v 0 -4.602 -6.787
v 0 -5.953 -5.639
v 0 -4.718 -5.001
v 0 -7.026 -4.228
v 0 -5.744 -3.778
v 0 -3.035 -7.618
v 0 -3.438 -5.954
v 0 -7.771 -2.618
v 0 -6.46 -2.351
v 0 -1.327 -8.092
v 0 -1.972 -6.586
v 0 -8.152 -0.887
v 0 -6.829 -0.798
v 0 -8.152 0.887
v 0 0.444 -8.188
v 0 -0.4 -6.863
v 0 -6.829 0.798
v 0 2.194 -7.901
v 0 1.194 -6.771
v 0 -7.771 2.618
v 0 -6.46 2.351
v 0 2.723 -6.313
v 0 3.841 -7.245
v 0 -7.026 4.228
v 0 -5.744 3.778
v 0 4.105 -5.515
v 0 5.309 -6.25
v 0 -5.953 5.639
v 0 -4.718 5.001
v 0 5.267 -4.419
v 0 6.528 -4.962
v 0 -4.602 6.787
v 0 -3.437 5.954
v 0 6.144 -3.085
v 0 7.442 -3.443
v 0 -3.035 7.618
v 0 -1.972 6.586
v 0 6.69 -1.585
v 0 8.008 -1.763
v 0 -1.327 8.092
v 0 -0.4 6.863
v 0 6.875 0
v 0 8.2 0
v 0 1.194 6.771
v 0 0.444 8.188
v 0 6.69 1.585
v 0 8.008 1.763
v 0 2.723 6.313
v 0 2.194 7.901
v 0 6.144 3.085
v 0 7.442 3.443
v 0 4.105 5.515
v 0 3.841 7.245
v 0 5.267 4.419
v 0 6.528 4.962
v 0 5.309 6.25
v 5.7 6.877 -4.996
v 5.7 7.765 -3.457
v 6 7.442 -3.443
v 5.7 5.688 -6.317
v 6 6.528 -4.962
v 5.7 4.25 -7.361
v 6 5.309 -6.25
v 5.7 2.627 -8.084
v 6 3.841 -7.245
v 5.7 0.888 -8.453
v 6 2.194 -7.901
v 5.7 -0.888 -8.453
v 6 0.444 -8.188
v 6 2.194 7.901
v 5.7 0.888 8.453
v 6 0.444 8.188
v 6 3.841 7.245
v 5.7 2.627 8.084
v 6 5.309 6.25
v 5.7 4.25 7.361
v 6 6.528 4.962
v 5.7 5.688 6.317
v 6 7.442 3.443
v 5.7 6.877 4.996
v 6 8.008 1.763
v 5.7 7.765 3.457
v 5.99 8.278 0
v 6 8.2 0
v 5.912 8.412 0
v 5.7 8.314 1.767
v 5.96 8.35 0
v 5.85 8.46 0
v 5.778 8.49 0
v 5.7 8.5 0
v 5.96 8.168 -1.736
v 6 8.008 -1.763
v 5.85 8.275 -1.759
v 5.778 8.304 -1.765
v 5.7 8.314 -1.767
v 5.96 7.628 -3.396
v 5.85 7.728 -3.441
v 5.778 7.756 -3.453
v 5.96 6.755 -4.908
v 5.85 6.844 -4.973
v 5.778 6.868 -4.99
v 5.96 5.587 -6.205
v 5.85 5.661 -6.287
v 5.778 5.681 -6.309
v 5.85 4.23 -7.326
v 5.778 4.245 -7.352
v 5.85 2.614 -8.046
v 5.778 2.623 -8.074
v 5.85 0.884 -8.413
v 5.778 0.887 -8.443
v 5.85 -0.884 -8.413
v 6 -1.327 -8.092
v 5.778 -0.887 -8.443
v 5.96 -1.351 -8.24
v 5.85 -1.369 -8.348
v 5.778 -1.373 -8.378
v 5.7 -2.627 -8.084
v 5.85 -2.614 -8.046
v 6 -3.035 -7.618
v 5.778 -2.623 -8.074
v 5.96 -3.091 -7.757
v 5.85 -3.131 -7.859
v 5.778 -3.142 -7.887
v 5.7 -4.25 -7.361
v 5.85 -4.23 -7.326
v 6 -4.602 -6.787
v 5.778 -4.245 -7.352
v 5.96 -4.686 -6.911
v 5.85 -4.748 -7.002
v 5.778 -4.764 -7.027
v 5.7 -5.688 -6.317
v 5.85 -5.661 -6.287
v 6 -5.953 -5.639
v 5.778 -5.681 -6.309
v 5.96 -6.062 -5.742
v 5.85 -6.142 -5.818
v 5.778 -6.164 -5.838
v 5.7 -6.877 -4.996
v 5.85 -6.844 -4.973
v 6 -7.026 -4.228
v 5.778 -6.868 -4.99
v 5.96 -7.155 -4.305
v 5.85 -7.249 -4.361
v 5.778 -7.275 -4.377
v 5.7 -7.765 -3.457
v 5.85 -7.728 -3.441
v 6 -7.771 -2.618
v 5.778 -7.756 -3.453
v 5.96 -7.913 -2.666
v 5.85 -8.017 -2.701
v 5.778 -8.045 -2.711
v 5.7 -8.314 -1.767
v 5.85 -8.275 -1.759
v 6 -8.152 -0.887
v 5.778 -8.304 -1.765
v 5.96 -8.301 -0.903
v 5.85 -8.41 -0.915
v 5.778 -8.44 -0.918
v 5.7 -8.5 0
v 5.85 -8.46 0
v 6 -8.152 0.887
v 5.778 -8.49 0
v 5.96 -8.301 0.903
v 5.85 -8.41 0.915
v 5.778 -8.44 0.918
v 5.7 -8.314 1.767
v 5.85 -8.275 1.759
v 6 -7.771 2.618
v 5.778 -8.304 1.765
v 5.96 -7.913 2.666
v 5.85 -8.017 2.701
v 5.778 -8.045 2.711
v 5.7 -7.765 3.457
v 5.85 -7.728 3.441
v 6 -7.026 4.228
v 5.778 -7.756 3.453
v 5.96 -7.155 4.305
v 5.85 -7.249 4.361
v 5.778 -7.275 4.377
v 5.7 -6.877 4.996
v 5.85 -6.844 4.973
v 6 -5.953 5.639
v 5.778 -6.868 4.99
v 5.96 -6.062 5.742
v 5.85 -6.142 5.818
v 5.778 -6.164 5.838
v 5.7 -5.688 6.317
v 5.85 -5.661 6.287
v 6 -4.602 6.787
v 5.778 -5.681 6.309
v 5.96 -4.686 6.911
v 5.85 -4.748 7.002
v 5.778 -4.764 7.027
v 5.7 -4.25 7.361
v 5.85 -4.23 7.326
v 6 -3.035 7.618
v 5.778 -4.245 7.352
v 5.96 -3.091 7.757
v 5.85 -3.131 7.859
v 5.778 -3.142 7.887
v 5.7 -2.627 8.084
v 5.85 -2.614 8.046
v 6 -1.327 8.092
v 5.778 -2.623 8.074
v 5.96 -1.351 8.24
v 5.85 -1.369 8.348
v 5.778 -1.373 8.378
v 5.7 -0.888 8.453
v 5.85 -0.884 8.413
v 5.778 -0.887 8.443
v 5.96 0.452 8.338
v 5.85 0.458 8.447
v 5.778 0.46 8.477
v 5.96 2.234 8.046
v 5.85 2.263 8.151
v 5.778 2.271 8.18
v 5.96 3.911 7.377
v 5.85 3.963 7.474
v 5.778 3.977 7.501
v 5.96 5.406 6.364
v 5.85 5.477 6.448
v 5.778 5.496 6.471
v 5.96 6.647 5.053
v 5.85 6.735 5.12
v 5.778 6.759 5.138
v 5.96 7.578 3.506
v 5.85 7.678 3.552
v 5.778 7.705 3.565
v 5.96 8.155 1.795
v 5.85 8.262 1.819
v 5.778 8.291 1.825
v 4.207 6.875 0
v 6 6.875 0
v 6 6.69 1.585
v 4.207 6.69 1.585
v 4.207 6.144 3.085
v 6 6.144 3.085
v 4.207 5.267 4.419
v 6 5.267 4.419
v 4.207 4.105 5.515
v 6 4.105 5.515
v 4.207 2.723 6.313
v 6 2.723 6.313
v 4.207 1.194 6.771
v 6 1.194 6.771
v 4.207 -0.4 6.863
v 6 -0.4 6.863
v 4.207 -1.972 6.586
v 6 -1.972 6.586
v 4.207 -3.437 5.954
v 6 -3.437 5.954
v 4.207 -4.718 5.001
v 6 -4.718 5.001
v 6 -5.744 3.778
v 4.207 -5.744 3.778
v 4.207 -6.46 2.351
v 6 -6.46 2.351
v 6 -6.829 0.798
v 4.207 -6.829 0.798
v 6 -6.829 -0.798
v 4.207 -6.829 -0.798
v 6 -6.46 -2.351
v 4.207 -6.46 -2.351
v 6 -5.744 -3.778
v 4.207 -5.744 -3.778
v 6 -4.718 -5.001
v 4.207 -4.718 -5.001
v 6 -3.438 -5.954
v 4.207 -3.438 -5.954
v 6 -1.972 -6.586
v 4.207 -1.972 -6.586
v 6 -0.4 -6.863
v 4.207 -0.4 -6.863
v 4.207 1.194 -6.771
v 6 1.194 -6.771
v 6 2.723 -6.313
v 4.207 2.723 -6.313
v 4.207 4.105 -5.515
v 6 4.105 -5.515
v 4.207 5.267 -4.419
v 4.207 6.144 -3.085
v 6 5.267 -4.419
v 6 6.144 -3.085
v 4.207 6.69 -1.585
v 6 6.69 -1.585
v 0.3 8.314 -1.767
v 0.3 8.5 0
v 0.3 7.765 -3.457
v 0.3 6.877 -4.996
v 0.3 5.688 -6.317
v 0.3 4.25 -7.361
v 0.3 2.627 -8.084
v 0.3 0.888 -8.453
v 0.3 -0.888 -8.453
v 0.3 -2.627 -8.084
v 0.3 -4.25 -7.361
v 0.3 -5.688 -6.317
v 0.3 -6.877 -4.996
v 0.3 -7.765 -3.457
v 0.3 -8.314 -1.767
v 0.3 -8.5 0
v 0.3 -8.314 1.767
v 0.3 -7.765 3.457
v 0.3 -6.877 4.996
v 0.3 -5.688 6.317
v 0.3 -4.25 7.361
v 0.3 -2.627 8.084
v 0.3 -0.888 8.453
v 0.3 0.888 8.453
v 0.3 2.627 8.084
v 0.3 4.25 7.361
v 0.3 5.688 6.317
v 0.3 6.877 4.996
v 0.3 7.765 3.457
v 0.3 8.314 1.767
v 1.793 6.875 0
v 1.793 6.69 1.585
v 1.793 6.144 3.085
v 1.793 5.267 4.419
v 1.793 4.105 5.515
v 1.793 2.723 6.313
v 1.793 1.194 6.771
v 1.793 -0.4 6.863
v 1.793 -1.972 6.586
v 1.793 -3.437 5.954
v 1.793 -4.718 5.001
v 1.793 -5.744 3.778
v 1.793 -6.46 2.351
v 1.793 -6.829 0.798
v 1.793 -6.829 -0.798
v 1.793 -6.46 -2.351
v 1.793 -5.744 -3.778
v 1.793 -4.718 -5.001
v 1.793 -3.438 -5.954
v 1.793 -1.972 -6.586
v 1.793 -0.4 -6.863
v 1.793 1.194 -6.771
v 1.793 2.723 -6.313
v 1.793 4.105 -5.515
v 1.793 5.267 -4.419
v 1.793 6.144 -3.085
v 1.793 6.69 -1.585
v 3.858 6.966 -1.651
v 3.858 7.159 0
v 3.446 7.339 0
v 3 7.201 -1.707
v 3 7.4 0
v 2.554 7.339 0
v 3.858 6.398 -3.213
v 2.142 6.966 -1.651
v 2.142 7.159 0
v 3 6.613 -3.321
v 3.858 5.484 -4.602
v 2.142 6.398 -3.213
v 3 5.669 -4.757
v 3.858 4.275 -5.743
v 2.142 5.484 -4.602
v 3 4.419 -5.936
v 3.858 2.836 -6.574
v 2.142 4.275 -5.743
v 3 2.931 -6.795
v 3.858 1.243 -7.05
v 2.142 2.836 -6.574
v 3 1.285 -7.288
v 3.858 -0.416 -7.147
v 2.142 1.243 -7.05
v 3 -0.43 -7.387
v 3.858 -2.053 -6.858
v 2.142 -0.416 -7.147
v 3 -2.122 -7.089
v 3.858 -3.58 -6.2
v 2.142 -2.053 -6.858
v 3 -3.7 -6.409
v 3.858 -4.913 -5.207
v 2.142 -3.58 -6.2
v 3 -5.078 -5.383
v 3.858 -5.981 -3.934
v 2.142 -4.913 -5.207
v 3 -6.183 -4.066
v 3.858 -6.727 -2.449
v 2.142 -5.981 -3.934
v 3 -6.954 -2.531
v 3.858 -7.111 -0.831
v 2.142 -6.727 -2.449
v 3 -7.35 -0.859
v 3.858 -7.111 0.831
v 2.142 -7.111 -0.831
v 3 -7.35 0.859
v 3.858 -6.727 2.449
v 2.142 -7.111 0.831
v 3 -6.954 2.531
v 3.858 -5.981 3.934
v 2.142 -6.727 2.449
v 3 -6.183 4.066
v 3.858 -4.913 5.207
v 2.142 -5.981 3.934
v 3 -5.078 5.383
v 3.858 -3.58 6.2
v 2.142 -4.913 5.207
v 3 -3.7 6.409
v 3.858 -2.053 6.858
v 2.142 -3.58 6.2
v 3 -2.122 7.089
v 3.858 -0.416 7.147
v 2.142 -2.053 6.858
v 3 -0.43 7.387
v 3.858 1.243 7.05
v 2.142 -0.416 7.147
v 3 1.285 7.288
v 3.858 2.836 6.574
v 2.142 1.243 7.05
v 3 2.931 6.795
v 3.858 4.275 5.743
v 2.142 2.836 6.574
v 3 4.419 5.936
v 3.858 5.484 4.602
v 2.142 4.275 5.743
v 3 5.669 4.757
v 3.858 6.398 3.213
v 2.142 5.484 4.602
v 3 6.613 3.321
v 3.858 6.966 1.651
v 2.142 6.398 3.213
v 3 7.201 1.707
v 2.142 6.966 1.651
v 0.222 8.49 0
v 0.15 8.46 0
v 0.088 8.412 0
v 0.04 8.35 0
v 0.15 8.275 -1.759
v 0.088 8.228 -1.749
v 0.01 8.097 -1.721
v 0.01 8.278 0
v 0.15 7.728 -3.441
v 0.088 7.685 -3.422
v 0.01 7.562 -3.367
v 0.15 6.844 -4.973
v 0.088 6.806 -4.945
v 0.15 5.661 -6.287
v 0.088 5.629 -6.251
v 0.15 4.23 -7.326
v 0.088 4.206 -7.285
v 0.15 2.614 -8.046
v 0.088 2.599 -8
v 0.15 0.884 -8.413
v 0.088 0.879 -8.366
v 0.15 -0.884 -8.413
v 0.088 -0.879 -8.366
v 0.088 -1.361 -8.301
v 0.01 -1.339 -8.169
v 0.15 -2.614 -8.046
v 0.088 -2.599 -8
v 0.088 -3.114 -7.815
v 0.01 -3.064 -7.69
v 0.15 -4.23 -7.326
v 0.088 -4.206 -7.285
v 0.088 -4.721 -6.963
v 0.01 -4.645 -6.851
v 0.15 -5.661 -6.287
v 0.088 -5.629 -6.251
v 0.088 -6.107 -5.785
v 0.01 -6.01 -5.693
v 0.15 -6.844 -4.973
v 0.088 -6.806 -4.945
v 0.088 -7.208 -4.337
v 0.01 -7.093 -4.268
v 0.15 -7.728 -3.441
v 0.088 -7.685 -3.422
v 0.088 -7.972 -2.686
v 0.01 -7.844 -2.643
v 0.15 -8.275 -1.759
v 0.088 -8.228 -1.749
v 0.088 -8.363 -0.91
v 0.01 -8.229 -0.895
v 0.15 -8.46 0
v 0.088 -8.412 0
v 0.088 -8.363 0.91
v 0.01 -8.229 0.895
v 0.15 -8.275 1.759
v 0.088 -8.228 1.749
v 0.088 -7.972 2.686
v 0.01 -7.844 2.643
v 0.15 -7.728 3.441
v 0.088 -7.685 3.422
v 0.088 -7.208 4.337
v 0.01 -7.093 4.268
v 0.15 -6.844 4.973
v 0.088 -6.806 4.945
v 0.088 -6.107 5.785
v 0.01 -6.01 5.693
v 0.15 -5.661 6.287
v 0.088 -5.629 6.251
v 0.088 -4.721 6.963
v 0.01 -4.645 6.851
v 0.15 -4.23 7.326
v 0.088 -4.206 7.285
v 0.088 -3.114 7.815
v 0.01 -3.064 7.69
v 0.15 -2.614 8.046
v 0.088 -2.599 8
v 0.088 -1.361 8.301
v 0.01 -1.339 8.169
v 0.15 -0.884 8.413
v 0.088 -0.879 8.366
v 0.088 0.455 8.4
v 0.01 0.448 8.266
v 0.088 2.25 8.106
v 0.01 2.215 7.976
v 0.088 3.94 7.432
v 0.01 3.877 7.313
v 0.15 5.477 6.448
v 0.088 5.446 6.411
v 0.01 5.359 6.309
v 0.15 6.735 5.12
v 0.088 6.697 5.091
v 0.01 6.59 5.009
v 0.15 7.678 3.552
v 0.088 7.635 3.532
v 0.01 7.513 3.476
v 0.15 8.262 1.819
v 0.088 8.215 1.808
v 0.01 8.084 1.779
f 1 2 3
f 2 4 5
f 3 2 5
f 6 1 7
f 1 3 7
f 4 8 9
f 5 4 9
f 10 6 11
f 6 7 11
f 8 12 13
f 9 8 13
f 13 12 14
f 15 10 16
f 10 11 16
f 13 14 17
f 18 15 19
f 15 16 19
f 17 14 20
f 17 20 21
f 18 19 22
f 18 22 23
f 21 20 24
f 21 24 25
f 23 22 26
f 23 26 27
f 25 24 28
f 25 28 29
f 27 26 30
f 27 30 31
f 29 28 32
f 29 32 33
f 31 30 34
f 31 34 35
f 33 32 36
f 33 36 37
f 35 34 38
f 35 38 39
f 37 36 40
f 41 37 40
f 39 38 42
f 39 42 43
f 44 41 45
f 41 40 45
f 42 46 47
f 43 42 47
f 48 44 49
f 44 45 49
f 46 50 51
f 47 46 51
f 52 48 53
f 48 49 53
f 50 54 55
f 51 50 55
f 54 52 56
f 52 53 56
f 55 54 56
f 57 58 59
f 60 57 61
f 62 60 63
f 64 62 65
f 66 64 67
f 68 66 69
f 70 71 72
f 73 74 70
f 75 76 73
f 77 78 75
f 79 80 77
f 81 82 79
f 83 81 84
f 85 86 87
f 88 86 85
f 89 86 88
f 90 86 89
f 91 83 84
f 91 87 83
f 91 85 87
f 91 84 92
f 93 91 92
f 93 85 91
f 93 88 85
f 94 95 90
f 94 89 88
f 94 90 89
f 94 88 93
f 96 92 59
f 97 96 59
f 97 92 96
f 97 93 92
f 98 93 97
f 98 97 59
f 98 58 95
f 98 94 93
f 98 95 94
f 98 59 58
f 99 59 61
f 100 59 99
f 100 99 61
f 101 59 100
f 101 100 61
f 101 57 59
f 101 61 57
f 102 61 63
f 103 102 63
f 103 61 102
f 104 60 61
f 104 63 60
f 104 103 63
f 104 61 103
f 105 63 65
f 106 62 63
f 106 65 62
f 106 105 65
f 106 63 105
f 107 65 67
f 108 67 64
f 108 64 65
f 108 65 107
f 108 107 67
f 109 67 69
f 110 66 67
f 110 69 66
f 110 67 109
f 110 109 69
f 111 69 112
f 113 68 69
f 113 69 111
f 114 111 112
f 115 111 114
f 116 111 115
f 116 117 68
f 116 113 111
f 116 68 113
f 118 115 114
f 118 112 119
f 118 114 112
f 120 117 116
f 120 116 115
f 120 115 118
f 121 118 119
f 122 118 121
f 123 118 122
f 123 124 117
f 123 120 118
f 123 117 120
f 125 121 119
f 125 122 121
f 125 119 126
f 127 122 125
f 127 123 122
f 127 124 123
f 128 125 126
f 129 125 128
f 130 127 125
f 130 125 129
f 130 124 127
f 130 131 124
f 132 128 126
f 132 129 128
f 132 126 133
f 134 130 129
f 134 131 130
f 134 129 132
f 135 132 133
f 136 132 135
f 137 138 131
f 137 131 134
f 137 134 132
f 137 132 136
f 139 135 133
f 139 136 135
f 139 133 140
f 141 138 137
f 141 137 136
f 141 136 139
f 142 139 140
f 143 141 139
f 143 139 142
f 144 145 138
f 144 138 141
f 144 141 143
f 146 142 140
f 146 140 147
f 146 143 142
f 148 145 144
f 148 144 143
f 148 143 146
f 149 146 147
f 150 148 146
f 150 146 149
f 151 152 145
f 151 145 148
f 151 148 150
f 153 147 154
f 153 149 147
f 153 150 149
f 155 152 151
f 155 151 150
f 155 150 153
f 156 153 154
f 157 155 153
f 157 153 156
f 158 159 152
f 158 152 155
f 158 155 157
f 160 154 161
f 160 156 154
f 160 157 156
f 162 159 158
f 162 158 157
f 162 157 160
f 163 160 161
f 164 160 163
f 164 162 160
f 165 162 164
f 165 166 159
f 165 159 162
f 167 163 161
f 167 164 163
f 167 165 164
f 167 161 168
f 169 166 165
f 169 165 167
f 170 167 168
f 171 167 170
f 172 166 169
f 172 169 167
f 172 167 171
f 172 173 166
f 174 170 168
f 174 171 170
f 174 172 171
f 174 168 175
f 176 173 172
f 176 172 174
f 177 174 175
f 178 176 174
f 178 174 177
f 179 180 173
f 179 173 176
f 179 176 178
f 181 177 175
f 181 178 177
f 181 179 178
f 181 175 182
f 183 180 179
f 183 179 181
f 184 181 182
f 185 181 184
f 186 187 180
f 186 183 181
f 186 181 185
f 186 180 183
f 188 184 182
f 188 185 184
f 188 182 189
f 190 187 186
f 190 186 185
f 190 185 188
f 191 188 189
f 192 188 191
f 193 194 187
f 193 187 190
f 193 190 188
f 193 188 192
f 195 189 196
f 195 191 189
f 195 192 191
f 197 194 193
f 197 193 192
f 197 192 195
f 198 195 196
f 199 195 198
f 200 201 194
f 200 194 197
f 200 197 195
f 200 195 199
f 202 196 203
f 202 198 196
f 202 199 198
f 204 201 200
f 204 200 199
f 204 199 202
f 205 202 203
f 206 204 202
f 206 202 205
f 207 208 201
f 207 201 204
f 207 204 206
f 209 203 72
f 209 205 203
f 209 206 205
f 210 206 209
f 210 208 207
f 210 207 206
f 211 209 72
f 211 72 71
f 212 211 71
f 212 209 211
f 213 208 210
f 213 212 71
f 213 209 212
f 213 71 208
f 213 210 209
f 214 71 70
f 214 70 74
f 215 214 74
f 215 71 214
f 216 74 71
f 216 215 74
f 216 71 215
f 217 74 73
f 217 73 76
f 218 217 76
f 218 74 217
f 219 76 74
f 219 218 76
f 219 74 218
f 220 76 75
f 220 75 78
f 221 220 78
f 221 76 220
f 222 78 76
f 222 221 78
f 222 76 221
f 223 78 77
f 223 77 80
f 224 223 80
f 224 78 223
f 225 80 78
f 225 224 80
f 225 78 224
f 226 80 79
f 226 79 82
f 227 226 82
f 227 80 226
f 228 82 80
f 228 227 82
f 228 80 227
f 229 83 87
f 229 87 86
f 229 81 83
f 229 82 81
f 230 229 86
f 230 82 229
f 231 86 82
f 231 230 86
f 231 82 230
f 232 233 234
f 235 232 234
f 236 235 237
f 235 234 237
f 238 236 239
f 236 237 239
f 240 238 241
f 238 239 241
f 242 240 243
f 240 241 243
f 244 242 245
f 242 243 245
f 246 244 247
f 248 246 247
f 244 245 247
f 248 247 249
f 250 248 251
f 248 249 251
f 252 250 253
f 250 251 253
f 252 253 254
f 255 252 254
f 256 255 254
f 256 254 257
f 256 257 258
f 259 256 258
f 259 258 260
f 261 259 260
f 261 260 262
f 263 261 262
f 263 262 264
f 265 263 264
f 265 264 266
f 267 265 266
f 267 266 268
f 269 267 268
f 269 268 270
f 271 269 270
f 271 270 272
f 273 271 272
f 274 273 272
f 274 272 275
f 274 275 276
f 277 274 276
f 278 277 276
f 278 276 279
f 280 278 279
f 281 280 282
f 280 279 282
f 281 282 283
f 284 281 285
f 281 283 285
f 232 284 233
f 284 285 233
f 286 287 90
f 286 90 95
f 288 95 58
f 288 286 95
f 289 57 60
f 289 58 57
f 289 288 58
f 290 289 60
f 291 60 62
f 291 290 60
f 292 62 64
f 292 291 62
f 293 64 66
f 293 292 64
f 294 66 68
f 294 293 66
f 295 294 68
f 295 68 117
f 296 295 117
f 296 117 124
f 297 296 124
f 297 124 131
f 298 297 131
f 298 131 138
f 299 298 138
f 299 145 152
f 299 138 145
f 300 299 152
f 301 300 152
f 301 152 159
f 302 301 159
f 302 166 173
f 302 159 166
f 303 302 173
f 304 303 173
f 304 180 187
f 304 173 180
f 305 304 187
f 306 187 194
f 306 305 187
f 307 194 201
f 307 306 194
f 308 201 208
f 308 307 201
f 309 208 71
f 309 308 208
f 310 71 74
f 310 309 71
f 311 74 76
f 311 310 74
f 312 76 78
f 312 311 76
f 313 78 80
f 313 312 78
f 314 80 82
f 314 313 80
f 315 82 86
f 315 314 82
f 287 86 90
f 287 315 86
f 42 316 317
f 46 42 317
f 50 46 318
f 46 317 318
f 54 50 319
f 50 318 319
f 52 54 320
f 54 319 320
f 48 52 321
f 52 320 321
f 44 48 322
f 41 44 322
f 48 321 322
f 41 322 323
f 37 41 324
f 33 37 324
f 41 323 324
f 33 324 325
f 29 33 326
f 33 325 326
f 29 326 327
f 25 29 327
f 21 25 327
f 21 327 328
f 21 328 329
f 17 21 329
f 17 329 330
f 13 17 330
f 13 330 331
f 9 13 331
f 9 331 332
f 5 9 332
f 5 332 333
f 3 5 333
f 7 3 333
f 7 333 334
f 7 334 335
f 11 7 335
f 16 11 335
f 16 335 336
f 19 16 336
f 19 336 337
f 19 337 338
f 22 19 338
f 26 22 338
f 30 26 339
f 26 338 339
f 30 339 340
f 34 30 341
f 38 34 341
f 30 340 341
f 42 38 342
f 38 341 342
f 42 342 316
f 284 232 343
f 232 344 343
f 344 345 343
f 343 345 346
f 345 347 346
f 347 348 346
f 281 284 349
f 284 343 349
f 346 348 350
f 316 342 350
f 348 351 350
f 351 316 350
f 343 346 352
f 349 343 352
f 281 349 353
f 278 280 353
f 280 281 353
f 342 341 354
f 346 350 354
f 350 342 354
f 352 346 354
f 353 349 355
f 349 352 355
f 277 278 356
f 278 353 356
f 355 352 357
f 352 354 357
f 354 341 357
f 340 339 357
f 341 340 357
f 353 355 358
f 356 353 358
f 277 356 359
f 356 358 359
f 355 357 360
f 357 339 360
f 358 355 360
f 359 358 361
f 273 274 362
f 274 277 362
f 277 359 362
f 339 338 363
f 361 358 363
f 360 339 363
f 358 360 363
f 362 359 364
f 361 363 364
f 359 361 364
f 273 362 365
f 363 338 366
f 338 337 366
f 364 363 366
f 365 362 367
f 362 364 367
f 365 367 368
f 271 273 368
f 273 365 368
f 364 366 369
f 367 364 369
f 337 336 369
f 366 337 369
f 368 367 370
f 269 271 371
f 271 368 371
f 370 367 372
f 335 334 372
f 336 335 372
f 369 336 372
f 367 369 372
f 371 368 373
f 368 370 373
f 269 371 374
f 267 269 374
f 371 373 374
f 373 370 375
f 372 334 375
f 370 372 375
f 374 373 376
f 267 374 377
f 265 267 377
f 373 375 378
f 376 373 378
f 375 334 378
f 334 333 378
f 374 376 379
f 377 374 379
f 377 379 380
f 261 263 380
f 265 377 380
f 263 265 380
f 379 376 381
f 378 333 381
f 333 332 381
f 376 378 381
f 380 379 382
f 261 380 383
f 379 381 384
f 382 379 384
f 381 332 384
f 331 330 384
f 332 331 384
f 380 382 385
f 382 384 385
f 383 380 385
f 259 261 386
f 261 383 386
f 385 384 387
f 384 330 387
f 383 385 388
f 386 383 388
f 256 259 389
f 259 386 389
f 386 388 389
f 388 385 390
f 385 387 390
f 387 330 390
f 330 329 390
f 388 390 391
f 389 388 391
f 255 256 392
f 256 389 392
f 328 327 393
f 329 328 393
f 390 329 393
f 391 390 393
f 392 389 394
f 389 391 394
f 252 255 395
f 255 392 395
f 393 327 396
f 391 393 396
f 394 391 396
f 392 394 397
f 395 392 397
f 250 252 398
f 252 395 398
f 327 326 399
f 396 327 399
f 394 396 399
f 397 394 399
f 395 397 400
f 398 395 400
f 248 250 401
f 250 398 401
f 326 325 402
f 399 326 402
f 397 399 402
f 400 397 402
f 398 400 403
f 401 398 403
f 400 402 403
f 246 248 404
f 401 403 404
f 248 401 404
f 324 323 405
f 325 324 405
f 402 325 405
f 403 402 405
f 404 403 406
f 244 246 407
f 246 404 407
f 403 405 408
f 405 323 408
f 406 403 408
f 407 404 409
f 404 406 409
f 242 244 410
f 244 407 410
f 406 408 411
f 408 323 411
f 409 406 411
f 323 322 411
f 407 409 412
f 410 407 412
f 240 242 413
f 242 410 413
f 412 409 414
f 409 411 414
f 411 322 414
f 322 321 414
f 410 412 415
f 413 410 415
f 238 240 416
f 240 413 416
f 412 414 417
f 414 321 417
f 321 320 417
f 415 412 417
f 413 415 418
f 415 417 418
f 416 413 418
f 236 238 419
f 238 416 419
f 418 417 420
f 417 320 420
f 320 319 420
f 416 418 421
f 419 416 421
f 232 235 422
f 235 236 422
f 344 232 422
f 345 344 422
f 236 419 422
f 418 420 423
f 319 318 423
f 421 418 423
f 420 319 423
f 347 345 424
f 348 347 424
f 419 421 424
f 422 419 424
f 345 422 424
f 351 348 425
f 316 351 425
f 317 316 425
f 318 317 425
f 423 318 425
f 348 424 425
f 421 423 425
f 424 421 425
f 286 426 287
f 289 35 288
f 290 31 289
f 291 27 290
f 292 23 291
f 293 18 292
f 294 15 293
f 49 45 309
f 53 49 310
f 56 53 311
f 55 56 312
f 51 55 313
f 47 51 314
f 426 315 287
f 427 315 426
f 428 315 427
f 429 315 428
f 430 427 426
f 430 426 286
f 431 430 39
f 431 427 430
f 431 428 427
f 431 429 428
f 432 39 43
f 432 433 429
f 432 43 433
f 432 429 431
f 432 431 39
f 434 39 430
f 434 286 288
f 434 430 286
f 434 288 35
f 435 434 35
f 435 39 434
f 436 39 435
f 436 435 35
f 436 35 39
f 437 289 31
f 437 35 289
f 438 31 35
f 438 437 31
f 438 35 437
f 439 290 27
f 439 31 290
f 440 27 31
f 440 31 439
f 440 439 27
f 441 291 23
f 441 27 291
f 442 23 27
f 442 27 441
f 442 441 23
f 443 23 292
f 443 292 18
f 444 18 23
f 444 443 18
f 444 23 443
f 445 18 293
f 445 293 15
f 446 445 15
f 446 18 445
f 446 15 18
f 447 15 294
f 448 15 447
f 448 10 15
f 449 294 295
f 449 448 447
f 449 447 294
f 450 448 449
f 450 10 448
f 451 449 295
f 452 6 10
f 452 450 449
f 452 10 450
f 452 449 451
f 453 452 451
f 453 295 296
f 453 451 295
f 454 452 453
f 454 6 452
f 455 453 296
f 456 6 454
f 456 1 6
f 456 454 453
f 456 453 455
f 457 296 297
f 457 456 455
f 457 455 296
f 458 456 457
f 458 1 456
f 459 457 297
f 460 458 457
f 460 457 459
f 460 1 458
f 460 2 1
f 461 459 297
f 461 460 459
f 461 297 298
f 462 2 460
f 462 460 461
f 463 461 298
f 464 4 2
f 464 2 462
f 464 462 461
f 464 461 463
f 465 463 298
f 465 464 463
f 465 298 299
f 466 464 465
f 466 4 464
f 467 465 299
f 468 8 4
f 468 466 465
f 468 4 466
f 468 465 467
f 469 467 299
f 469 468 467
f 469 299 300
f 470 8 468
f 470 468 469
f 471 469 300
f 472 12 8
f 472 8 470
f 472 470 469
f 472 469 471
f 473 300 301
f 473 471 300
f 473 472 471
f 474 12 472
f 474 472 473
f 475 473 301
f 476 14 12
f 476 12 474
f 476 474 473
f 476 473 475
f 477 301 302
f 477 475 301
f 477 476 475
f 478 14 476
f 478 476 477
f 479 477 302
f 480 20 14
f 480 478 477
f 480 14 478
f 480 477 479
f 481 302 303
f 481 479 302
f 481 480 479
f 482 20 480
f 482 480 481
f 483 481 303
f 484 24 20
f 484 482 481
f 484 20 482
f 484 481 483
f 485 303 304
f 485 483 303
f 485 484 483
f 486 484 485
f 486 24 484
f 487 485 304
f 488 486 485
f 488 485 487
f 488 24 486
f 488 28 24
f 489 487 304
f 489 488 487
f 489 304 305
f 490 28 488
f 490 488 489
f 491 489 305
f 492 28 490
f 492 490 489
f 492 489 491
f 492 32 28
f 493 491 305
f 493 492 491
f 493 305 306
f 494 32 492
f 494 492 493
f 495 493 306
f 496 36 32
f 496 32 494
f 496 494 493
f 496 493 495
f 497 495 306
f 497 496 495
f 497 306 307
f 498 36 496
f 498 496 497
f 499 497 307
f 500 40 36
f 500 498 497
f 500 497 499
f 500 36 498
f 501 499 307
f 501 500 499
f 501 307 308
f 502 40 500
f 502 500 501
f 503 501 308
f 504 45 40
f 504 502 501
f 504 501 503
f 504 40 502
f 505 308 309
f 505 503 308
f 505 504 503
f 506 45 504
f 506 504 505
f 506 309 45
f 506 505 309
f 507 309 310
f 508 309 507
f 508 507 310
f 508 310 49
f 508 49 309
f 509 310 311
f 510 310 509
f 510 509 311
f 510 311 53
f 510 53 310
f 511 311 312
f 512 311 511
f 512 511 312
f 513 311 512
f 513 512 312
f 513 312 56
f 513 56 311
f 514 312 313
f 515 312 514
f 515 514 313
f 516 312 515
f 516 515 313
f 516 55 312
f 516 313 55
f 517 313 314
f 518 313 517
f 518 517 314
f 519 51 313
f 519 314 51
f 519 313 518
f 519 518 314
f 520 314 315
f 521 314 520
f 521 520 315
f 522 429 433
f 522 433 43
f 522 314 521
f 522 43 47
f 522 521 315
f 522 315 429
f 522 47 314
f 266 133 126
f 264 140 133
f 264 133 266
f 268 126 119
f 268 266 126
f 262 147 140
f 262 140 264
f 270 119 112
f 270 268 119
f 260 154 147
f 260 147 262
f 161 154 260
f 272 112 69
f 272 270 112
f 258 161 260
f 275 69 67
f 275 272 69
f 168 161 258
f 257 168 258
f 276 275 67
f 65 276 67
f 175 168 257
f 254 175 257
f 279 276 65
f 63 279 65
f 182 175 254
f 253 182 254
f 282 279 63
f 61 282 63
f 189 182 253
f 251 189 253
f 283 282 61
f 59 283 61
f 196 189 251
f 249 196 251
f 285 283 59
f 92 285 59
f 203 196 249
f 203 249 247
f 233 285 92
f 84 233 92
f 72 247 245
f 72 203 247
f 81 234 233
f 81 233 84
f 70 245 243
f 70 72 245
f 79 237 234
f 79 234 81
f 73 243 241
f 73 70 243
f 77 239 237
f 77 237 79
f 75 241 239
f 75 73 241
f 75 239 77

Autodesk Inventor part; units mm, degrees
sketch "Sketch_1" plane through (0, 0, 0) normal (0, 0, 1) x (1, 0, 0)
  line L0 (6, 0) -> (0, 0)
  line L1 (0, 6.875) -> (1.793, 6.875)
  arc A0 (4.207, 6.875) -> (1.793, 6.875) centre (3, 5.75) ccw
  line L2 (4.207, 6.875) -> (6, 6.875)
  line L3 (6, 6.875) -> (6, 8.2)
  arc A1 (6, 8.2) -> (5.7, 8.5) centre (5.7, 8.2) ccw
  line L4 (5.7, 8.5) -> (0.3, 8.5)
  arc A2 (0.3, 8.5) -> (0, 8.2) centre (0.3, 8.2) ccw
  line L5 (0, 8.2) -> (0, 6.875)
revolve "Revolution1" add sketch "Sketch_1" angle 360 about axis through (6, 0, 0) along (1, 0, 0)
ref_plane "ip_ot_or_XY" through (0, 0, 0) normal (1, 0, 0) x (0, 0, -1)
ref_plane "ip_ot_or_YZ" through (0, 0, 0) normal (0, 0, -1) x (0, 1, 0)
ref_plane "ip_ot_or_ZX" through (0, 0, 0) normal (0, 1, 0) x (1, 0, 0)
properties part number "606 Outer Ring" material "Steel"
